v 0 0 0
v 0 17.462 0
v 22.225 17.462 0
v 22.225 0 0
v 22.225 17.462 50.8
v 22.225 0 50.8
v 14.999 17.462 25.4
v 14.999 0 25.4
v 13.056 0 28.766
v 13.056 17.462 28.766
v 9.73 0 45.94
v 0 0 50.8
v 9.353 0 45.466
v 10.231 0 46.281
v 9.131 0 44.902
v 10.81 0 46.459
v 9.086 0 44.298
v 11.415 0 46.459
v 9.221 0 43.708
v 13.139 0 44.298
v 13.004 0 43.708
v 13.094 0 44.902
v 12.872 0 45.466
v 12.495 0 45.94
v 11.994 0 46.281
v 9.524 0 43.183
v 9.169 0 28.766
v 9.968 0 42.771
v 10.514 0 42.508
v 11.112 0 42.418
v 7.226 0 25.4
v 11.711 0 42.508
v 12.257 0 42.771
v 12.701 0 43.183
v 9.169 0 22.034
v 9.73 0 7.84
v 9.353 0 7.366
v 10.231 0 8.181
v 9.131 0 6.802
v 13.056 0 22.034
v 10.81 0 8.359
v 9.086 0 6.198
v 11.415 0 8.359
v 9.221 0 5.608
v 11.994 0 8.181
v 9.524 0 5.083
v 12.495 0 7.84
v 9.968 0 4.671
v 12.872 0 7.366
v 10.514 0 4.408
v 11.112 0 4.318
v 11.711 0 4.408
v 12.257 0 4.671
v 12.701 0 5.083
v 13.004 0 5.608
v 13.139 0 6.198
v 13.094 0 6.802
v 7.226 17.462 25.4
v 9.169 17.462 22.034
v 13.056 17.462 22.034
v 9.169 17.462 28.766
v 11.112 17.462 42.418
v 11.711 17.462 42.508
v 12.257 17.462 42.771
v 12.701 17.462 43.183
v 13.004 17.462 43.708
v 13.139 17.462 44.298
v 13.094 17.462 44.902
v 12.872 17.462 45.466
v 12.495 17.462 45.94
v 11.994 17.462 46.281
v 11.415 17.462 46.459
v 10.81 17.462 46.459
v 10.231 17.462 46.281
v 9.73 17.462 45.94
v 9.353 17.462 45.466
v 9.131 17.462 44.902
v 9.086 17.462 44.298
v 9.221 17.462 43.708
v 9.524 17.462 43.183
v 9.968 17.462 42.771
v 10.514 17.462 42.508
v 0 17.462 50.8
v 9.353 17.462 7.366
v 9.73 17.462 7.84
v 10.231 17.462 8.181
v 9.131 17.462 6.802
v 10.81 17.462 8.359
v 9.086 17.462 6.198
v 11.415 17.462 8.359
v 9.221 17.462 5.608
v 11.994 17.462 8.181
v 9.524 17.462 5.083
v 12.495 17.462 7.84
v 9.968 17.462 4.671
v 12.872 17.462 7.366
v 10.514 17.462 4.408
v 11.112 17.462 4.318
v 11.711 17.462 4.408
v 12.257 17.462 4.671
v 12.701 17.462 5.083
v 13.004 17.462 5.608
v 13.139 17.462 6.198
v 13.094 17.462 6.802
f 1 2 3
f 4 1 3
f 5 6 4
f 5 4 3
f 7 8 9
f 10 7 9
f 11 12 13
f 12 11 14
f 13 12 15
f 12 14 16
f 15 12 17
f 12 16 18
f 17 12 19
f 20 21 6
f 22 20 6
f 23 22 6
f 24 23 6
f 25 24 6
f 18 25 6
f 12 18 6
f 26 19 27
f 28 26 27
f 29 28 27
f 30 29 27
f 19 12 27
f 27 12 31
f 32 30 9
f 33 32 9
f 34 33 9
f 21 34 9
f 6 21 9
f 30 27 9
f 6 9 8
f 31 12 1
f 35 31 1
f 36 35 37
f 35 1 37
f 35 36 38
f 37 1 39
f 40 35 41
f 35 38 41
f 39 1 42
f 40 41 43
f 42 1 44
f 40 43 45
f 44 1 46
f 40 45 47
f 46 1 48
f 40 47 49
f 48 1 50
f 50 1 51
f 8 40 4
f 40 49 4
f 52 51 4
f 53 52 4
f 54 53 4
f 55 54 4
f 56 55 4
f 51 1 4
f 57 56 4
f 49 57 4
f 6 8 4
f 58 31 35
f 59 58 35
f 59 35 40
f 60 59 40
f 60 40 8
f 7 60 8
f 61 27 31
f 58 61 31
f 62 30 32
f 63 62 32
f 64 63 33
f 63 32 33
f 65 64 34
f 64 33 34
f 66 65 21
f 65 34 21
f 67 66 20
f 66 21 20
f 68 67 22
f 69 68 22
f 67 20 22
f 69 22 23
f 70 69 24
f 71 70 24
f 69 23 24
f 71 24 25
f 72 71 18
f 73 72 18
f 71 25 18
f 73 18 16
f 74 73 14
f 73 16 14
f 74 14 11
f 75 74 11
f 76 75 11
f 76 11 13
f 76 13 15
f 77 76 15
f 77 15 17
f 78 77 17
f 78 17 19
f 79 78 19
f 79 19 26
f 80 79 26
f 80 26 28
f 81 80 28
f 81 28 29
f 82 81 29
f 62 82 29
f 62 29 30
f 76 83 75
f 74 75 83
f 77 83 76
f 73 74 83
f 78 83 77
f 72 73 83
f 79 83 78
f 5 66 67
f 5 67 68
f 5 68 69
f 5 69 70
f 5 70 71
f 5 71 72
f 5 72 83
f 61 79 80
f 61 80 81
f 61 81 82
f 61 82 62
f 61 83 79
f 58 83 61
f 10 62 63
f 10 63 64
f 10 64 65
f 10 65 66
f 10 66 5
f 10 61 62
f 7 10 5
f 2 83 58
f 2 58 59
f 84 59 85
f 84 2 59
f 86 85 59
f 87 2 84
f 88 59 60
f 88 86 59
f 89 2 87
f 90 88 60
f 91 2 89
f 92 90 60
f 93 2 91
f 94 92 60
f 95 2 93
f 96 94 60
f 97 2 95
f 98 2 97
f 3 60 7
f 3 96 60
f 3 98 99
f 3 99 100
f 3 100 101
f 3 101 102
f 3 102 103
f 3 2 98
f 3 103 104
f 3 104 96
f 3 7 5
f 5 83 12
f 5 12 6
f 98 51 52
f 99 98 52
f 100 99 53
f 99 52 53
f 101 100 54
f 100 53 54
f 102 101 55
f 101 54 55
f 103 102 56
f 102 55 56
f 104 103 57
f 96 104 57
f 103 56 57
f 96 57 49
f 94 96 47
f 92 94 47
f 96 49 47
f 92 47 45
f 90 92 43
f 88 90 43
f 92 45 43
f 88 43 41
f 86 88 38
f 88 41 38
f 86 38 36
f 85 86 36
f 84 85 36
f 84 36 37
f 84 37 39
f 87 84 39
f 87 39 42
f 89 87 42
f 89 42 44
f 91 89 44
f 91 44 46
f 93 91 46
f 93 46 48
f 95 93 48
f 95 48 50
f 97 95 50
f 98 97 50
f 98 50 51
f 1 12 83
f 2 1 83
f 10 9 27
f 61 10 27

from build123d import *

# Parameters (mm, degrees)
SKETCH1_W           = 22.225
SKETCH1_H           = 17.4625
BOSS_EXTRUDE1_DEPTH = 50.8
CUT_EXTRUDE1_REACH  = 60.134
SKETCH2_R           = 2.032


with BuildPart() as part:
    # Sketch1 → Boss-Extrude1 (new body)
    with BuildSketch(Plane.XY):
        with Locations((11.1125, 8.73125)):
            Rectangle(SKETCH1_W, SKETCH1_H)
    extrude(amount=BOSS_EXTRUDE1_DEPTH)

    # Sketch2 → Cut-Extrude1 (cut, up to next)
    with BuildSketch(Plane.XZ, mode=Mode.PRIVATE) as cut_extrude1_sk1:
        with Locations(Location((11.1125, 44.45, 0), (0, 0, 270))):
            Circle(SKETCH2_R)
    cut_extrude1_tool1 = extrude(cut_extrude1_sk1.sketch, amount=-CUT_EXTRUDE1_REACH, mode=Mode.PRIVATE) & part.part
    # Sketch2 → Cut-Extrude1 (cut, up to next)
    with BuildSketch(Plane.XZ, mode=Mode.PRIVATE) as cut_extrude1_sk2:
        with Locations(Location((11.1125, 6.35, 0), (0, 0, 270))):
            Circle(SKETCH2_R)
    cut_extrude1_tool2 = extrude(cut_extrude1_sk2.sketch, amount=-CUT_EXTRUDE1_REACH, mode=Mode.PRIVATE) & part.part
    # Sketch2 → Cut-Extrude1 (cut, up to next)
    with BuildSketch(Plane.XZ, mode=Mode.PRIVATE) as cut_extrude1_sk3:
        Polygon((14.998644662, 25.4), (13.055572331, 28.7655), (9.169427669, 28.7655), (7.226355338, 25.4), (9.169427669, 22.0345), (13.055572331, 22.0345), align=None)
    cut_extrude1_tool3 = extrude(cut_extrude1_sk3.sketch, amount=-CUT_EXTRUDE1_REACH, mode=Mode.PRIVATE) & part.part
    add(cut_extrude1_tool1.solids().sort_by_distance((11.1125, 0, 44.45))[0], mode=Mode.SUBTRACT)
    add(cut_extrude1_tool2.solids().sort_by_distance((11.1125, 0, 6.35))[0], mode=Mode.SUBTRACT)
    add(cut_extrude1_tool3.solids().sort_by_distance((11.1125, 0, 25.4))[0], mode=Mode.SUBTRACT)


solid = part.part
